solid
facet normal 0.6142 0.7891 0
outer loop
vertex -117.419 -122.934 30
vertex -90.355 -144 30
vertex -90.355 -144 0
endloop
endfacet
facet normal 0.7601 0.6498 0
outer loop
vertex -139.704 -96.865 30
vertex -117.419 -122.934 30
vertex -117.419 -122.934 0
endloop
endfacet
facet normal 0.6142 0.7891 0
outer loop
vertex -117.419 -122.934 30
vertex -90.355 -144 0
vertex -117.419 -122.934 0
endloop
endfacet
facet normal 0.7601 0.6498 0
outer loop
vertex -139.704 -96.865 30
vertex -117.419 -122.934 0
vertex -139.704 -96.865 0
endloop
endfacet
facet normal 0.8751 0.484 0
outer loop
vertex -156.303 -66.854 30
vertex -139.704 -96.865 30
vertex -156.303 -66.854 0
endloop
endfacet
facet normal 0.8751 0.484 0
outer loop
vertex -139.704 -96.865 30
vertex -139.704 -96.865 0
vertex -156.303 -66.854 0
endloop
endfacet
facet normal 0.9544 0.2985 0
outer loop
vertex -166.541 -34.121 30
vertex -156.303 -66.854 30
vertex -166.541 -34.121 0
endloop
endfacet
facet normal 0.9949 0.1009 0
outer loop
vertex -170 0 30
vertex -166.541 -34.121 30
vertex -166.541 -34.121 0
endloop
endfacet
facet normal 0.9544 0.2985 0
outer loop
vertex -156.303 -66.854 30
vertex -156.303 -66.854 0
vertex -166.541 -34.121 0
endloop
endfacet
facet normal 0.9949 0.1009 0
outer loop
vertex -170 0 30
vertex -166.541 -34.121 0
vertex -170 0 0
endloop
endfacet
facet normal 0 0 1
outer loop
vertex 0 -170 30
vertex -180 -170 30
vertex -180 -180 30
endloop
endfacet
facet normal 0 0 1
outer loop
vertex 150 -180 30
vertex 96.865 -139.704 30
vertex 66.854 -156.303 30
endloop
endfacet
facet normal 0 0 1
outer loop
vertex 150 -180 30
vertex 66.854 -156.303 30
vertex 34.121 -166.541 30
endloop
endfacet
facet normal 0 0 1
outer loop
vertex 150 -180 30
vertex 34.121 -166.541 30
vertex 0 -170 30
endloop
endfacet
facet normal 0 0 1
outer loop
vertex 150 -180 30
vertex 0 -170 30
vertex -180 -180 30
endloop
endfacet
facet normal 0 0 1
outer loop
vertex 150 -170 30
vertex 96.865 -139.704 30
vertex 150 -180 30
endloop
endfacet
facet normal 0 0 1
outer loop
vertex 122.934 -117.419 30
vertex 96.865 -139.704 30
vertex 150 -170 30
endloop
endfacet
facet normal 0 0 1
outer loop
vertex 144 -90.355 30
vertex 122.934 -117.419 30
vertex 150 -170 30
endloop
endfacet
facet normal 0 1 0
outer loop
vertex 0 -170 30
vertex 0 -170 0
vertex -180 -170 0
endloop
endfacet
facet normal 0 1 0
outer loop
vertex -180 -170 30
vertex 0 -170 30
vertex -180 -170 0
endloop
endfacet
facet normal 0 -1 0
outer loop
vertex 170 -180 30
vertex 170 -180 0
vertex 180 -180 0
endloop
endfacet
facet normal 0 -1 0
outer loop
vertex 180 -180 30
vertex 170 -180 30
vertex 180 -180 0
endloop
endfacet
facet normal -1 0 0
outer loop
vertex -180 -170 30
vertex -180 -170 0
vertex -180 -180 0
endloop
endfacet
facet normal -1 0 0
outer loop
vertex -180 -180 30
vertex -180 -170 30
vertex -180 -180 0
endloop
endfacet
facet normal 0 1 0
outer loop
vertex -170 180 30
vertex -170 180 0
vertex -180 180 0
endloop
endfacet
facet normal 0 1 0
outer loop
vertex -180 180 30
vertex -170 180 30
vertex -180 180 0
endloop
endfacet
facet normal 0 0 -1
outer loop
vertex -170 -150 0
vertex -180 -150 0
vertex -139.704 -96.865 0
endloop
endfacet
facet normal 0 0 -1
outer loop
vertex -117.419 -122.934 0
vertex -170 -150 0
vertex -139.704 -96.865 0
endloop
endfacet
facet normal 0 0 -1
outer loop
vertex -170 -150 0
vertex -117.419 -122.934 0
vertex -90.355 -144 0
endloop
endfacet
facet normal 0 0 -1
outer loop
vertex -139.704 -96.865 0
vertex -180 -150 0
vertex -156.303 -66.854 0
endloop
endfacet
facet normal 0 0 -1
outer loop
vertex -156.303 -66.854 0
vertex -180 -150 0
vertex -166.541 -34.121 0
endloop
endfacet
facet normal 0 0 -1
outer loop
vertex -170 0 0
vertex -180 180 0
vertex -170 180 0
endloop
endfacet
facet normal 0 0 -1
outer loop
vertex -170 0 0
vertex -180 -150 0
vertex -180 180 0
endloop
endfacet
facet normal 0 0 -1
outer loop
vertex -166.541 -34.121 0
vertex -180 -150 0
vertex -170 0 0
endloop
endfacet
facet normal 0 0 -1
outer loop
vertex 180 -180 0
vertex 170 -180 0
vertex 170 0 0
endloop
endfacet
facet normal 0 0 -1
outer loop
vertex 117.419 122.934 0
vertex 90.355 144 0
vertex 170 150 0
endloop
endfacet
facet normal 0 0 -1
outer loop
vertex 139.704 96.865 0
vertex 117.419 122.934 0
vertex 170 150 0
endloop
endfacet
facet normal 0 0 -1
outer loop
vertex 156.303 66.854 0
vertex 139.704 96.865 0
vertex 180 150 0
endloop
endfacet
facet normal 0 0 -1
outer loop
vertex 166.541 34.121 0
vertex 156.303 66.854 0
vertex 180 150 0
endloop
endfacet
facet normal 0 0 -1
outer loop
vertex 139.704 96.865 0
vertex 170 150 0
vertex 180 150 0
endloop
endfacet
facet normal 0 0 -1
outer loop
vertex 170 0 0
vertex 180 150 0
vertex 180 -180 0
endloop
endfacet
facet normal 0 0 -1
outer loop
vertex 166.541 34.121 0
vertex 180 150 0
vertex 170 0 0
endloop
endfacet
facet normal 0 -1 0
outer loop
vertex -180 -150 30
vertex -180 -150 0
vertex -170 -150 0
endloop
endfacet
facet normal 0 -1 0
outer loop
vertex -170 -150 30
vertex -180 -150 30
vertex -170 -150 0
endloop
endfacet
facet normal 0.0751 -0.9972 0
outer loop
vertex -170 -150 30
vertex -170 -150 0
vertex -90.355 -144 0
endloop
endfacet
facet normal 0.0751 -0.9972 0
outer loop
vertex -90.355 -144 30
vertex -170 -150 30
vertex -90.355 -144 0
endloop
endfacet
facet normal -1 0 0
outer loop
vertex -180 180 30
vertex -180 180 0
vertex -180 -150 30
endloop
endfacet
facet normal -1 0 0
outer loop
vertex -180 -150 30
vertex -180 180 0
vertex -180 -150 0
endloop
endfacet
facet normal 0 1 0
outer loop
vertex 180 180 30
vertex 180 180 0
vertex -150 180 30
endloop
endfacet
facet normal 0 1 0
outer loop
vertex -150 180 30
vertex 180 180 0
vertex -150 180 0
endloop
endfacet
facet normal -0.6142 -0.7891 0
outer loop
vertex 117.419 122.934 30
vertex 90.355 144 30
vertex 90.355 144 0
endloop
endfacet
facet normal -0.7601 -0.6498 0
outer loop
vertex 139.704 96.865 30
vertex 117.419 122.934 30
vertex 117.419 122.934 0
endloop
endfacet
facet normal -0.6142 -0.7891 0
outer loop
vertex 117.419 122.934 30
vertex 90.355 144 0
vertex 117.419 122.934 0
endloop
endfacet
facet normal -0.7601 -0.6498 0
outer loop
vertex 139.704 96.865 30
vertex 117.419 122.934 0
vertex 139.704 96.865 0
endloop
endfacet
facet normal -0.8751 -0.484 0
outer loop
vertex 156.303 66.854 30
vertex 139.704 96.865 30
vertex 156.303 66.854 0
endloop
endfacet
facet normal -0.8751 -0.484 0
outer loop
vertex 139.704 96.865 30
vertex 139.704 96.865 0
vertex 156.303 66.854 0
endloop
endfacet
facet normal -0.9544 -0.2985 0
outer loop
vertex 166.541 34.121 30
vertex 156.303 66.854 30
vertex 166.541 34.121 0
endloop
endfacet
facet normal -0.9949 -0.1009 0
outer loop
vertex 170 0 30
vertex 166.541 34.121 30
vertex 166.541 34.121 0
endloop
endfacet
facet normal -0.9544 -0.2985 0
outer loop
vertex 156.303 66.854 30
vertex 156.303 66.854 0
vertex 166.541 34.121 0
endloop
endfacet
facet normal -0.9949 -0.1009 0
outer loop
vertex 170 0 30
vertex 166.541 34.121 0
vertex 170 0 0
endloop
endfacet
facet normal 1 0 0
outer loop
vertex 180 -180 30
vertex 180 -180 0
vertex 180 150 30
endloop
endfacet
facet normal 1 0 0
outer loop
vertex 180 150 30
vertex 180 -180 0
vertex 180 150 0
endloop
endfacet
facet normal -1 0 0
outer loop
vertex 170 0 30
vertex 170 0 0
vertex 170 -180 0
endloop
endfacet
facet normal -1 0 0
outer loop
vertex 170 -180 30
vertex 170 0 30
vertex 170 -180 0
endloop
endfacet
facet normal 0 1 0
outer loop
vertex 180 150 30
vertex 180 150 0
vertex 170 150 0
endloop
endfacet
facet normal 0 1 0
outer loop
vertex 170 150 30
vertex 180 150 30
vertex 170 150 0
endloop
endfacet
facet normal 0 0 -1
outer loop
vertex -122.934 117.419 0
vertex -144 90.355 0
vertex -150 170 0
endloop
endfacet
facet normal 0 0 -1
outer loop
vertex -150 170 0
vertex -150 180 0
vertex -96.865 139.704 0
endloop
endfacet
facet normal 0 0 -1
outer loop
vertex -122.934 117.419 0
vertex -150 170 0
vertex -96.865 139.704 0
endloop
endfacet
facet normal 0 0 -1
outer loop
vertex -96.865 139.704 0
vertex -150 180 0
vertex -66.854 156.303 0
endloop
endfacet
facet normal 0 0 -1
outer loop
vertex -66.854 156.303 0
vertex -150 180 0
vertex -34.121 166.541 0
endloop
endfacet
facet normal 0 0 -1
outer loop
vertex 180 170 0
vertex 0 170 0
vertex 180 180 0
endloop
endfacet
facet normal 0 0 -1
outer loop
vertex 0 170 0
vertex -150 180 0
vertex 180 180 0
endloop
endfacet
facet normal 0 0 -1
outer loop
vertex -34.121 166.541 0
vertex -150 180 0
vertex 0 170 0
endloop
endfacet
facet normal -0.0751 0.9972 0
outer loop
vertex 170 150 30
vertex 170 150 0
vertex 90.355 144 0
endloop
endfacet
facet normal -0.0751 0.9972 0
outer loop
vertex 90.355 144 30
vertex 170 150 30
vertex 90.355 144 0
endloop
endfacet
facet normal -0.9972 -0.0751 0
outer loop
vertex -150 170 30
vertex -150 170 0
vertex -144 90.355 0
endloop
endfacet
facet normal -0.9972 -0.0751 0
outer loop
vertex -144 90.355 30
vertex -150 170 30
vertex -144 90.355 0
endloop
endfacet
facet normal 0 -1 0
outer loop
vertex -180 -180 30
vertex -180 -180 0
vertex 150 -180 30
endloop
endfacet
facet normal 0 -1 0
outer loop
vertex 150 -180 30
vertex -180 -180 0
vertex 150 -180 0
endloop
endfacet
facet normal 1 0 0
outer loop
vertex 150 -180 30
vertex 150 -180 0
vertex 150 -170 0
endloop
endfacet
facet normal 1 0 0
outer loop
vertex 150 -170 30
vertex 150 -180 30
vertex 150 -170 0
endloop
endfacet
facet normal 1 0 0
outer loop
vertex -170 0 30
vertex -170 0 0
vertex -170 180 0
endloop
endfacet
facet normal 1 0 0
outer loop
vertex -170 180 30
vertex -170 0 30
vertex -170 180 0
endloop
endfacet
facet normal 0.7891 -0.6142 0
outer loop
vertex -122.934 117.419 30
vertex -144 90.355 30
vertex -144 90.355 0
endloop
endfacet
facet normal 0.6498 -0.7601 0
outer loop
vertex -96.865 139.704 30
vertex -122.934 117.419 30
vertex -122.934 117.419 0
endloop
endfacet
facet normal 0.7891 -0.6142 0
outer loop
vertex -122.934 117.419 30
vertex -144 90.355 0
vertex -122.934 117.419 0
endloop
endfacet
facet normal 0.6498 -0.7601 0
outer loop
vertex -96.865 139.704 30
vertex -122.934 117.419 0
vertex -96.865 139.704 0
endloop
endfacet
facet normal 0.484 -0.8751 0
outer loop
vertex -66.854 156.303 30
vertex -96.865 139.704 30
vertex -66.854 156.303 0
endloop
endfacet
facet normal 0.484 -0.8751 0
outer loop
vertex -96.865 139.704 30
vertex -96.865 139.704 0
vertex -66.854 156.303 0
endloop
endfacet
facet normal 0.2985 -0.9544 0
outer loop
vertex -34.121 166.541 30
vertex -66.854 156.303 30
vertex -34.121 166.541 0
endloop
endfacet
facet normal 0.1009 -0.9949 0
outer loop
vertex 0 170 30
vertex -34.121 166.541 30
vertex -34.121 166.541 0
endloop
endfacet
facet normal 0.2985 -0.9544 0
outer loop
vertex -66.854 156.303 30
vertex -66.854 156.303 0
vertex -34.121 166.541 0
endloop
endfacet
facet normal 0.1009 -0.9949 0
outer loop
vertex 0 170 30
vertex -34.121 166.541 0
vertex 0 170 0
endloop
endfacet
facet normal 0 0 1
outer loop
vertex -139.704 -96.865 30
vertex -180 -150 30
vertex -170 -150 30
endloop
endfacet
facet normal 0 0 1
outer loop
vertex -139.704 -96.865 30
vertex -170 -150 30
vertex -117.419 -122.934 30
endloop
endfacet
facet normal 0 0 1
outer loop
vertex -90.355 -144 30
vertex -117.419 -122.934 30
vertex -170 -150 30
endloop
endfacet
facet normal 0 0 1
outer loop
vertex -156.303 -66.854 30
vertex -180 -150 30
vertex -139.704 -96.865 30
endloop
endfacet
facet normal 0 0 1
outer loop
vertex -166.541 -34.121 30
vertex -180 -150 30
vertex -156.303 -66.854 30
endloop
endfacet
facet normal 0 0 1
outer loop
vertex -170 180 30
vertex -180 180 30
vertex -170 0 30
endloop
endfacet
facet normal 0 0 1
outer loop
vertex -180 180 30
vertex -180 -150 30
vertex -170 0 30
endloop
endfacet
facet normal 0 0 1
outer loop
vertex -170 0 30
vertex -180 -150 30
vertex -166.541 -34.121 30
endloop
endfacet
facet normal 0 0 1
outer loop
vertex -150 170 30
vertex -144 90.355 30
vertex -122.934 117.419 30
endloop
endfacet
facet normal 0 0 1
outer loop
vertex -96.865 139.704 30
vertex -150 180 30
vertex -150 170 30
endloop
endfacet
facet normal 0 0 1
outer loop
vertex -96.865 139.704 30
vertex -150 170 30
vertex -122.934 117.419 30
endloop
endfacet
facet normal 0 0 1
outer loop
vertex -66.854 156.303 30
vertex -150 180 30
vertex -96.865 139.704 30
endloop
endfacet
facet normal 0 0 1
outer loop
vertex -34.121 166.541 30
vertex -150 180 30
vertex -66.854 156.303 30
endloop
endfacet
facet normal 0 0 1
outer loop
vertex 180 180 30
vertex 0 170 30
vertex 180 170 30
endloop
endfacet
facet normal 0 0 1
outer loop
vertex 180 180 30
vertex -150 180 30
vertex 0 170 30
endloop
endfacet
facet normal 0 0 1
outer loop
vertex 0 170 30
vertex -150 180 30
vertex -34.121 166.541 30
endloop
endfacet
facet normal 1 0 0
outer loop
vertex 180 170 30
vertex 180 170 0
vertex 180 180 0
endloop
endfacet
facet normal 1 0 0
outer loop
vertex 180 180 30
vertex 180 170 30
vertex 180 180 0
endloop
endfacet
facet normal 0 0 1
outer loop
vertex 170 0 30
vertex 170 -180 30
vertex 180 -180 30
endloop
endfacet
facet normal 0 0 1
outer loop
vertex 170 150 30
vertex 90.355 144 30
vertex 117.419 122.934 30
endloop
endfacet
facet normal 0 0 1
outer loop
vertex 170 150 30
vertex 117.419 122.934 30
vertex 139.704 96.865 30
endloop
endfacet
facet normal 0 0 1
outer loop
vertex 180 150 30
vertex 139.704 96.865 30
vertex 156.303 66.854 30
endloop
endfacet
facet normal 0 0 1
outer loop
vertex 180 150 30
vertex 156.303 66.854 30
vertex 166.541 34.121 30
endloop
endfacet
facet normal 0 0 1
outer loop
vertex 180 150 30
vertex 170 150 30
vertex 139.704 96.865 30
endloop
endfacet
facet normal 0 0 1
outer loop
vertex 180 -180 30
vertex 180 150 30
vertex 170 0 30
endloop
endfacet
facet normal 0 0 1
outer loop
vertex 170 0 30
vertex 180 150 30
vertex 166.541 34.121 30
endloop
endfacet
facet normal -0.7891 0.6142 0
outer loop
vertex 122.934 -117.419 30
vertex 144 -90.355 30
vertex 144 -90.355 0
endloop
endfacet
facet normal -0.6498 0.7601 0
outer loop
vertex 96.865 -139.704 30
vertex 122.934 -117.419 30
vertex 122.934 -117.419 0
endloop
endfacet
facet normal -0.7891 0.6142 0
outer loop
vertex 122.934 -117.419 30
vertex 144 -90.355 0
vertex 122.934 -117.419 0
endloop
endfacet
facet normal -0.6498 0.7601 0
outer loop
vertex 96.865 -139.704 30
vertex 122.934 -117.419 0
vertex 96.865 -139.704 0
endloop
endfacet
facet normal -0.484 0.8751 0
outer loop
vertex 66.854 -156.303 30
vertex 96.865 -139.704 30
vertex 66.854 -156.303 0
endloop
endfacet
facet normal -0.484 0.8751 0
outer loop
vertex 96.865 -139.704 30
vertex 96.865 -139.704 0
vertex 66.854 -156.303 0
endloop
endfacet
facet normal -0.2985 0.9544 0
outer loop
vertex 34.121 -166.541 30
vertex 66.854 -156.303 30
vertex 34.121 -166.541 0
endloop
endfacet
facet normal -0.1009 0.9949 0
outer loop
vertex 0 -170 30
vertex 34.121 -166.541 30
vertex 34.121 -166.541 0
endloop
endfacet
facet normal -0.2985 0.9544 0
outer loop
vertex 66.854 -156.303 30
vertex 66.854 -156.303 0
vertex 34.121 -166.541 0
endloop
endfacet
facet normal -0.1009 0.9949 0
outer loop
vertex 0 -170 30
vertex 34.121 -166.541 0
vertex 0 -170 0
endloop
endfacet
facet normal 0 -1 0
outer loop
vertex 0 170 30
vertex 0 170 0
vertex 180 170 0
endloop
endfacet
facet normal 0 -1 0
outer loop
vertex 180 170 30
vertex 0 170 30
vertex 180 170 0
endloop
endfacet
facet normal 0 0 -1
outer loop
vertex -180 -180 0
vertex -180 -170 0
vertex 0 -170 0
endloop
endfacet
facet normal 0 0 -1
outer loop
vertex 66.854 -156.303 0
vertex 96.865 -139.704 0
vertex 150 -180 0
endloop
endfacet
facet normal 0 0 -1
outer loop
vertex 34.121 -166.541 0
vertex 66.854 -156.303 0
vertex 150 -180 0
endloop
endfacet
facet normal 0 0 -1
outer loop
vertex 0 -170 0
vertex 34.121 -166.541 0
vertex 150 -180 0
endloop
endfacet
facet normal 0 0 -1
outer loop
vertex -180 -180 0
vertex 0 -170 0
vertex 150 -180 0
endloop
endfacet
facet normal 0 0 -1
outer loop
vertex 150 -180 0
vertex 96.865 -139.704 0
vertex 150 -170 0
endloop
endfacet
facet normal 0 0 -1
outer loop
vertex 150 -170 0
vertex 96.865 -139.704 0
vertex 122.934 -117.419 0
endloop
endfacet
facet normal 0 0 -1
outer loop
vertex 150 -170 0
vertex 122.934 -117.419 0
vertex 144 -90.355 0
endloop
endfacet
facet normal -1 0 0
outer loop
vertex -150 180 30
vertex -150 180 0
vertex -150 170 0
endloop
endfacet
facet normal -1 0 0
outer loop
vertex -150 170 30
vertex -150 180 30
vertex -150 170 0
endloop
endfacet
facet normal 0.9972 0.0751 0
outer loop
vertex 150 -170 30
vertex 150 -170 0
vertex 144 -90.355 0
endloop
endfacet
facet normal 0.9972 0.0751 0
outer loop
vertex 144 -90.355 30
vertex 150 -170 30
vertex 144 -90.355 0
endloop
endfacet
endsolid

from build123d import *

# Parameters (mm, degrees)
F2_DEPTH = 30


with BuildPart() as f2:
    # F1 (on Top) → F2 (new body)
    with BuildSketch(Plane.XY):
        with BuildLine():
            ThreePointArc((-144, 90.354856), (-82.279021, 148.762101), (0, 170))
            Line((0, 170), (170, 170))
            Line((170, 170), (180, 170))
            Line((180, 170), (180, 180))
            Line((180, 180), (170, 180))
            Line((170, 180), (-150, 180))
            Line((-150, 180), (-150, 170))
            Line((-150, 170), (-144, 90.354856))
        make_face()
        with BuildLine():
            Line((0, -170), (-170, -170))
            Line((-170, -170), (-180, -170))
            Line((-180, -170), (-180, -180))
            Line((-180, -180), (-170, -180))
            Line((-170, -180), (150, -180))
            Line((150, -180), (150, -170))
            Line((150, -170), (144, -90.354856))
            ThreePointArc((144, -90.354856), (82.279021, -148.762101), (0, -170))
        make_face()
        with BuildLine():
            Line((-170, 0), (-170, 170))
            Line((-170, 170), (-170, 180))
            Line((-170, 180), (-180, 180))
            Line((-180, 180), (-180, 170))
            Line((-180, 170), (-180, -150))
            Line((-180, -150), (-170, -150))
            Line((-170, -150), (-90.354856, -144))
            ThreePointArc((-90.354856, -144), (-148.762101, -82.279021), (-170, 0))
        make_face()
        with BuildLine():
            ThreePointArc((90.354856, 144), (148.762101, 82.279021), (170, 0))
            Line((170, 0), (170, -170))
            Line((170, -170), (170, -180))
            Line((170, -180), (180, -180))
            Line((180, -180), (180, -170))
            Line((180, -170), (180, 150))
            Line((180, 150), (170, 150))
            Line((170, 150), (90.354856, 144))
        make_face()
    extrude(amount=F2_DEPTH)


solid = f2.part
